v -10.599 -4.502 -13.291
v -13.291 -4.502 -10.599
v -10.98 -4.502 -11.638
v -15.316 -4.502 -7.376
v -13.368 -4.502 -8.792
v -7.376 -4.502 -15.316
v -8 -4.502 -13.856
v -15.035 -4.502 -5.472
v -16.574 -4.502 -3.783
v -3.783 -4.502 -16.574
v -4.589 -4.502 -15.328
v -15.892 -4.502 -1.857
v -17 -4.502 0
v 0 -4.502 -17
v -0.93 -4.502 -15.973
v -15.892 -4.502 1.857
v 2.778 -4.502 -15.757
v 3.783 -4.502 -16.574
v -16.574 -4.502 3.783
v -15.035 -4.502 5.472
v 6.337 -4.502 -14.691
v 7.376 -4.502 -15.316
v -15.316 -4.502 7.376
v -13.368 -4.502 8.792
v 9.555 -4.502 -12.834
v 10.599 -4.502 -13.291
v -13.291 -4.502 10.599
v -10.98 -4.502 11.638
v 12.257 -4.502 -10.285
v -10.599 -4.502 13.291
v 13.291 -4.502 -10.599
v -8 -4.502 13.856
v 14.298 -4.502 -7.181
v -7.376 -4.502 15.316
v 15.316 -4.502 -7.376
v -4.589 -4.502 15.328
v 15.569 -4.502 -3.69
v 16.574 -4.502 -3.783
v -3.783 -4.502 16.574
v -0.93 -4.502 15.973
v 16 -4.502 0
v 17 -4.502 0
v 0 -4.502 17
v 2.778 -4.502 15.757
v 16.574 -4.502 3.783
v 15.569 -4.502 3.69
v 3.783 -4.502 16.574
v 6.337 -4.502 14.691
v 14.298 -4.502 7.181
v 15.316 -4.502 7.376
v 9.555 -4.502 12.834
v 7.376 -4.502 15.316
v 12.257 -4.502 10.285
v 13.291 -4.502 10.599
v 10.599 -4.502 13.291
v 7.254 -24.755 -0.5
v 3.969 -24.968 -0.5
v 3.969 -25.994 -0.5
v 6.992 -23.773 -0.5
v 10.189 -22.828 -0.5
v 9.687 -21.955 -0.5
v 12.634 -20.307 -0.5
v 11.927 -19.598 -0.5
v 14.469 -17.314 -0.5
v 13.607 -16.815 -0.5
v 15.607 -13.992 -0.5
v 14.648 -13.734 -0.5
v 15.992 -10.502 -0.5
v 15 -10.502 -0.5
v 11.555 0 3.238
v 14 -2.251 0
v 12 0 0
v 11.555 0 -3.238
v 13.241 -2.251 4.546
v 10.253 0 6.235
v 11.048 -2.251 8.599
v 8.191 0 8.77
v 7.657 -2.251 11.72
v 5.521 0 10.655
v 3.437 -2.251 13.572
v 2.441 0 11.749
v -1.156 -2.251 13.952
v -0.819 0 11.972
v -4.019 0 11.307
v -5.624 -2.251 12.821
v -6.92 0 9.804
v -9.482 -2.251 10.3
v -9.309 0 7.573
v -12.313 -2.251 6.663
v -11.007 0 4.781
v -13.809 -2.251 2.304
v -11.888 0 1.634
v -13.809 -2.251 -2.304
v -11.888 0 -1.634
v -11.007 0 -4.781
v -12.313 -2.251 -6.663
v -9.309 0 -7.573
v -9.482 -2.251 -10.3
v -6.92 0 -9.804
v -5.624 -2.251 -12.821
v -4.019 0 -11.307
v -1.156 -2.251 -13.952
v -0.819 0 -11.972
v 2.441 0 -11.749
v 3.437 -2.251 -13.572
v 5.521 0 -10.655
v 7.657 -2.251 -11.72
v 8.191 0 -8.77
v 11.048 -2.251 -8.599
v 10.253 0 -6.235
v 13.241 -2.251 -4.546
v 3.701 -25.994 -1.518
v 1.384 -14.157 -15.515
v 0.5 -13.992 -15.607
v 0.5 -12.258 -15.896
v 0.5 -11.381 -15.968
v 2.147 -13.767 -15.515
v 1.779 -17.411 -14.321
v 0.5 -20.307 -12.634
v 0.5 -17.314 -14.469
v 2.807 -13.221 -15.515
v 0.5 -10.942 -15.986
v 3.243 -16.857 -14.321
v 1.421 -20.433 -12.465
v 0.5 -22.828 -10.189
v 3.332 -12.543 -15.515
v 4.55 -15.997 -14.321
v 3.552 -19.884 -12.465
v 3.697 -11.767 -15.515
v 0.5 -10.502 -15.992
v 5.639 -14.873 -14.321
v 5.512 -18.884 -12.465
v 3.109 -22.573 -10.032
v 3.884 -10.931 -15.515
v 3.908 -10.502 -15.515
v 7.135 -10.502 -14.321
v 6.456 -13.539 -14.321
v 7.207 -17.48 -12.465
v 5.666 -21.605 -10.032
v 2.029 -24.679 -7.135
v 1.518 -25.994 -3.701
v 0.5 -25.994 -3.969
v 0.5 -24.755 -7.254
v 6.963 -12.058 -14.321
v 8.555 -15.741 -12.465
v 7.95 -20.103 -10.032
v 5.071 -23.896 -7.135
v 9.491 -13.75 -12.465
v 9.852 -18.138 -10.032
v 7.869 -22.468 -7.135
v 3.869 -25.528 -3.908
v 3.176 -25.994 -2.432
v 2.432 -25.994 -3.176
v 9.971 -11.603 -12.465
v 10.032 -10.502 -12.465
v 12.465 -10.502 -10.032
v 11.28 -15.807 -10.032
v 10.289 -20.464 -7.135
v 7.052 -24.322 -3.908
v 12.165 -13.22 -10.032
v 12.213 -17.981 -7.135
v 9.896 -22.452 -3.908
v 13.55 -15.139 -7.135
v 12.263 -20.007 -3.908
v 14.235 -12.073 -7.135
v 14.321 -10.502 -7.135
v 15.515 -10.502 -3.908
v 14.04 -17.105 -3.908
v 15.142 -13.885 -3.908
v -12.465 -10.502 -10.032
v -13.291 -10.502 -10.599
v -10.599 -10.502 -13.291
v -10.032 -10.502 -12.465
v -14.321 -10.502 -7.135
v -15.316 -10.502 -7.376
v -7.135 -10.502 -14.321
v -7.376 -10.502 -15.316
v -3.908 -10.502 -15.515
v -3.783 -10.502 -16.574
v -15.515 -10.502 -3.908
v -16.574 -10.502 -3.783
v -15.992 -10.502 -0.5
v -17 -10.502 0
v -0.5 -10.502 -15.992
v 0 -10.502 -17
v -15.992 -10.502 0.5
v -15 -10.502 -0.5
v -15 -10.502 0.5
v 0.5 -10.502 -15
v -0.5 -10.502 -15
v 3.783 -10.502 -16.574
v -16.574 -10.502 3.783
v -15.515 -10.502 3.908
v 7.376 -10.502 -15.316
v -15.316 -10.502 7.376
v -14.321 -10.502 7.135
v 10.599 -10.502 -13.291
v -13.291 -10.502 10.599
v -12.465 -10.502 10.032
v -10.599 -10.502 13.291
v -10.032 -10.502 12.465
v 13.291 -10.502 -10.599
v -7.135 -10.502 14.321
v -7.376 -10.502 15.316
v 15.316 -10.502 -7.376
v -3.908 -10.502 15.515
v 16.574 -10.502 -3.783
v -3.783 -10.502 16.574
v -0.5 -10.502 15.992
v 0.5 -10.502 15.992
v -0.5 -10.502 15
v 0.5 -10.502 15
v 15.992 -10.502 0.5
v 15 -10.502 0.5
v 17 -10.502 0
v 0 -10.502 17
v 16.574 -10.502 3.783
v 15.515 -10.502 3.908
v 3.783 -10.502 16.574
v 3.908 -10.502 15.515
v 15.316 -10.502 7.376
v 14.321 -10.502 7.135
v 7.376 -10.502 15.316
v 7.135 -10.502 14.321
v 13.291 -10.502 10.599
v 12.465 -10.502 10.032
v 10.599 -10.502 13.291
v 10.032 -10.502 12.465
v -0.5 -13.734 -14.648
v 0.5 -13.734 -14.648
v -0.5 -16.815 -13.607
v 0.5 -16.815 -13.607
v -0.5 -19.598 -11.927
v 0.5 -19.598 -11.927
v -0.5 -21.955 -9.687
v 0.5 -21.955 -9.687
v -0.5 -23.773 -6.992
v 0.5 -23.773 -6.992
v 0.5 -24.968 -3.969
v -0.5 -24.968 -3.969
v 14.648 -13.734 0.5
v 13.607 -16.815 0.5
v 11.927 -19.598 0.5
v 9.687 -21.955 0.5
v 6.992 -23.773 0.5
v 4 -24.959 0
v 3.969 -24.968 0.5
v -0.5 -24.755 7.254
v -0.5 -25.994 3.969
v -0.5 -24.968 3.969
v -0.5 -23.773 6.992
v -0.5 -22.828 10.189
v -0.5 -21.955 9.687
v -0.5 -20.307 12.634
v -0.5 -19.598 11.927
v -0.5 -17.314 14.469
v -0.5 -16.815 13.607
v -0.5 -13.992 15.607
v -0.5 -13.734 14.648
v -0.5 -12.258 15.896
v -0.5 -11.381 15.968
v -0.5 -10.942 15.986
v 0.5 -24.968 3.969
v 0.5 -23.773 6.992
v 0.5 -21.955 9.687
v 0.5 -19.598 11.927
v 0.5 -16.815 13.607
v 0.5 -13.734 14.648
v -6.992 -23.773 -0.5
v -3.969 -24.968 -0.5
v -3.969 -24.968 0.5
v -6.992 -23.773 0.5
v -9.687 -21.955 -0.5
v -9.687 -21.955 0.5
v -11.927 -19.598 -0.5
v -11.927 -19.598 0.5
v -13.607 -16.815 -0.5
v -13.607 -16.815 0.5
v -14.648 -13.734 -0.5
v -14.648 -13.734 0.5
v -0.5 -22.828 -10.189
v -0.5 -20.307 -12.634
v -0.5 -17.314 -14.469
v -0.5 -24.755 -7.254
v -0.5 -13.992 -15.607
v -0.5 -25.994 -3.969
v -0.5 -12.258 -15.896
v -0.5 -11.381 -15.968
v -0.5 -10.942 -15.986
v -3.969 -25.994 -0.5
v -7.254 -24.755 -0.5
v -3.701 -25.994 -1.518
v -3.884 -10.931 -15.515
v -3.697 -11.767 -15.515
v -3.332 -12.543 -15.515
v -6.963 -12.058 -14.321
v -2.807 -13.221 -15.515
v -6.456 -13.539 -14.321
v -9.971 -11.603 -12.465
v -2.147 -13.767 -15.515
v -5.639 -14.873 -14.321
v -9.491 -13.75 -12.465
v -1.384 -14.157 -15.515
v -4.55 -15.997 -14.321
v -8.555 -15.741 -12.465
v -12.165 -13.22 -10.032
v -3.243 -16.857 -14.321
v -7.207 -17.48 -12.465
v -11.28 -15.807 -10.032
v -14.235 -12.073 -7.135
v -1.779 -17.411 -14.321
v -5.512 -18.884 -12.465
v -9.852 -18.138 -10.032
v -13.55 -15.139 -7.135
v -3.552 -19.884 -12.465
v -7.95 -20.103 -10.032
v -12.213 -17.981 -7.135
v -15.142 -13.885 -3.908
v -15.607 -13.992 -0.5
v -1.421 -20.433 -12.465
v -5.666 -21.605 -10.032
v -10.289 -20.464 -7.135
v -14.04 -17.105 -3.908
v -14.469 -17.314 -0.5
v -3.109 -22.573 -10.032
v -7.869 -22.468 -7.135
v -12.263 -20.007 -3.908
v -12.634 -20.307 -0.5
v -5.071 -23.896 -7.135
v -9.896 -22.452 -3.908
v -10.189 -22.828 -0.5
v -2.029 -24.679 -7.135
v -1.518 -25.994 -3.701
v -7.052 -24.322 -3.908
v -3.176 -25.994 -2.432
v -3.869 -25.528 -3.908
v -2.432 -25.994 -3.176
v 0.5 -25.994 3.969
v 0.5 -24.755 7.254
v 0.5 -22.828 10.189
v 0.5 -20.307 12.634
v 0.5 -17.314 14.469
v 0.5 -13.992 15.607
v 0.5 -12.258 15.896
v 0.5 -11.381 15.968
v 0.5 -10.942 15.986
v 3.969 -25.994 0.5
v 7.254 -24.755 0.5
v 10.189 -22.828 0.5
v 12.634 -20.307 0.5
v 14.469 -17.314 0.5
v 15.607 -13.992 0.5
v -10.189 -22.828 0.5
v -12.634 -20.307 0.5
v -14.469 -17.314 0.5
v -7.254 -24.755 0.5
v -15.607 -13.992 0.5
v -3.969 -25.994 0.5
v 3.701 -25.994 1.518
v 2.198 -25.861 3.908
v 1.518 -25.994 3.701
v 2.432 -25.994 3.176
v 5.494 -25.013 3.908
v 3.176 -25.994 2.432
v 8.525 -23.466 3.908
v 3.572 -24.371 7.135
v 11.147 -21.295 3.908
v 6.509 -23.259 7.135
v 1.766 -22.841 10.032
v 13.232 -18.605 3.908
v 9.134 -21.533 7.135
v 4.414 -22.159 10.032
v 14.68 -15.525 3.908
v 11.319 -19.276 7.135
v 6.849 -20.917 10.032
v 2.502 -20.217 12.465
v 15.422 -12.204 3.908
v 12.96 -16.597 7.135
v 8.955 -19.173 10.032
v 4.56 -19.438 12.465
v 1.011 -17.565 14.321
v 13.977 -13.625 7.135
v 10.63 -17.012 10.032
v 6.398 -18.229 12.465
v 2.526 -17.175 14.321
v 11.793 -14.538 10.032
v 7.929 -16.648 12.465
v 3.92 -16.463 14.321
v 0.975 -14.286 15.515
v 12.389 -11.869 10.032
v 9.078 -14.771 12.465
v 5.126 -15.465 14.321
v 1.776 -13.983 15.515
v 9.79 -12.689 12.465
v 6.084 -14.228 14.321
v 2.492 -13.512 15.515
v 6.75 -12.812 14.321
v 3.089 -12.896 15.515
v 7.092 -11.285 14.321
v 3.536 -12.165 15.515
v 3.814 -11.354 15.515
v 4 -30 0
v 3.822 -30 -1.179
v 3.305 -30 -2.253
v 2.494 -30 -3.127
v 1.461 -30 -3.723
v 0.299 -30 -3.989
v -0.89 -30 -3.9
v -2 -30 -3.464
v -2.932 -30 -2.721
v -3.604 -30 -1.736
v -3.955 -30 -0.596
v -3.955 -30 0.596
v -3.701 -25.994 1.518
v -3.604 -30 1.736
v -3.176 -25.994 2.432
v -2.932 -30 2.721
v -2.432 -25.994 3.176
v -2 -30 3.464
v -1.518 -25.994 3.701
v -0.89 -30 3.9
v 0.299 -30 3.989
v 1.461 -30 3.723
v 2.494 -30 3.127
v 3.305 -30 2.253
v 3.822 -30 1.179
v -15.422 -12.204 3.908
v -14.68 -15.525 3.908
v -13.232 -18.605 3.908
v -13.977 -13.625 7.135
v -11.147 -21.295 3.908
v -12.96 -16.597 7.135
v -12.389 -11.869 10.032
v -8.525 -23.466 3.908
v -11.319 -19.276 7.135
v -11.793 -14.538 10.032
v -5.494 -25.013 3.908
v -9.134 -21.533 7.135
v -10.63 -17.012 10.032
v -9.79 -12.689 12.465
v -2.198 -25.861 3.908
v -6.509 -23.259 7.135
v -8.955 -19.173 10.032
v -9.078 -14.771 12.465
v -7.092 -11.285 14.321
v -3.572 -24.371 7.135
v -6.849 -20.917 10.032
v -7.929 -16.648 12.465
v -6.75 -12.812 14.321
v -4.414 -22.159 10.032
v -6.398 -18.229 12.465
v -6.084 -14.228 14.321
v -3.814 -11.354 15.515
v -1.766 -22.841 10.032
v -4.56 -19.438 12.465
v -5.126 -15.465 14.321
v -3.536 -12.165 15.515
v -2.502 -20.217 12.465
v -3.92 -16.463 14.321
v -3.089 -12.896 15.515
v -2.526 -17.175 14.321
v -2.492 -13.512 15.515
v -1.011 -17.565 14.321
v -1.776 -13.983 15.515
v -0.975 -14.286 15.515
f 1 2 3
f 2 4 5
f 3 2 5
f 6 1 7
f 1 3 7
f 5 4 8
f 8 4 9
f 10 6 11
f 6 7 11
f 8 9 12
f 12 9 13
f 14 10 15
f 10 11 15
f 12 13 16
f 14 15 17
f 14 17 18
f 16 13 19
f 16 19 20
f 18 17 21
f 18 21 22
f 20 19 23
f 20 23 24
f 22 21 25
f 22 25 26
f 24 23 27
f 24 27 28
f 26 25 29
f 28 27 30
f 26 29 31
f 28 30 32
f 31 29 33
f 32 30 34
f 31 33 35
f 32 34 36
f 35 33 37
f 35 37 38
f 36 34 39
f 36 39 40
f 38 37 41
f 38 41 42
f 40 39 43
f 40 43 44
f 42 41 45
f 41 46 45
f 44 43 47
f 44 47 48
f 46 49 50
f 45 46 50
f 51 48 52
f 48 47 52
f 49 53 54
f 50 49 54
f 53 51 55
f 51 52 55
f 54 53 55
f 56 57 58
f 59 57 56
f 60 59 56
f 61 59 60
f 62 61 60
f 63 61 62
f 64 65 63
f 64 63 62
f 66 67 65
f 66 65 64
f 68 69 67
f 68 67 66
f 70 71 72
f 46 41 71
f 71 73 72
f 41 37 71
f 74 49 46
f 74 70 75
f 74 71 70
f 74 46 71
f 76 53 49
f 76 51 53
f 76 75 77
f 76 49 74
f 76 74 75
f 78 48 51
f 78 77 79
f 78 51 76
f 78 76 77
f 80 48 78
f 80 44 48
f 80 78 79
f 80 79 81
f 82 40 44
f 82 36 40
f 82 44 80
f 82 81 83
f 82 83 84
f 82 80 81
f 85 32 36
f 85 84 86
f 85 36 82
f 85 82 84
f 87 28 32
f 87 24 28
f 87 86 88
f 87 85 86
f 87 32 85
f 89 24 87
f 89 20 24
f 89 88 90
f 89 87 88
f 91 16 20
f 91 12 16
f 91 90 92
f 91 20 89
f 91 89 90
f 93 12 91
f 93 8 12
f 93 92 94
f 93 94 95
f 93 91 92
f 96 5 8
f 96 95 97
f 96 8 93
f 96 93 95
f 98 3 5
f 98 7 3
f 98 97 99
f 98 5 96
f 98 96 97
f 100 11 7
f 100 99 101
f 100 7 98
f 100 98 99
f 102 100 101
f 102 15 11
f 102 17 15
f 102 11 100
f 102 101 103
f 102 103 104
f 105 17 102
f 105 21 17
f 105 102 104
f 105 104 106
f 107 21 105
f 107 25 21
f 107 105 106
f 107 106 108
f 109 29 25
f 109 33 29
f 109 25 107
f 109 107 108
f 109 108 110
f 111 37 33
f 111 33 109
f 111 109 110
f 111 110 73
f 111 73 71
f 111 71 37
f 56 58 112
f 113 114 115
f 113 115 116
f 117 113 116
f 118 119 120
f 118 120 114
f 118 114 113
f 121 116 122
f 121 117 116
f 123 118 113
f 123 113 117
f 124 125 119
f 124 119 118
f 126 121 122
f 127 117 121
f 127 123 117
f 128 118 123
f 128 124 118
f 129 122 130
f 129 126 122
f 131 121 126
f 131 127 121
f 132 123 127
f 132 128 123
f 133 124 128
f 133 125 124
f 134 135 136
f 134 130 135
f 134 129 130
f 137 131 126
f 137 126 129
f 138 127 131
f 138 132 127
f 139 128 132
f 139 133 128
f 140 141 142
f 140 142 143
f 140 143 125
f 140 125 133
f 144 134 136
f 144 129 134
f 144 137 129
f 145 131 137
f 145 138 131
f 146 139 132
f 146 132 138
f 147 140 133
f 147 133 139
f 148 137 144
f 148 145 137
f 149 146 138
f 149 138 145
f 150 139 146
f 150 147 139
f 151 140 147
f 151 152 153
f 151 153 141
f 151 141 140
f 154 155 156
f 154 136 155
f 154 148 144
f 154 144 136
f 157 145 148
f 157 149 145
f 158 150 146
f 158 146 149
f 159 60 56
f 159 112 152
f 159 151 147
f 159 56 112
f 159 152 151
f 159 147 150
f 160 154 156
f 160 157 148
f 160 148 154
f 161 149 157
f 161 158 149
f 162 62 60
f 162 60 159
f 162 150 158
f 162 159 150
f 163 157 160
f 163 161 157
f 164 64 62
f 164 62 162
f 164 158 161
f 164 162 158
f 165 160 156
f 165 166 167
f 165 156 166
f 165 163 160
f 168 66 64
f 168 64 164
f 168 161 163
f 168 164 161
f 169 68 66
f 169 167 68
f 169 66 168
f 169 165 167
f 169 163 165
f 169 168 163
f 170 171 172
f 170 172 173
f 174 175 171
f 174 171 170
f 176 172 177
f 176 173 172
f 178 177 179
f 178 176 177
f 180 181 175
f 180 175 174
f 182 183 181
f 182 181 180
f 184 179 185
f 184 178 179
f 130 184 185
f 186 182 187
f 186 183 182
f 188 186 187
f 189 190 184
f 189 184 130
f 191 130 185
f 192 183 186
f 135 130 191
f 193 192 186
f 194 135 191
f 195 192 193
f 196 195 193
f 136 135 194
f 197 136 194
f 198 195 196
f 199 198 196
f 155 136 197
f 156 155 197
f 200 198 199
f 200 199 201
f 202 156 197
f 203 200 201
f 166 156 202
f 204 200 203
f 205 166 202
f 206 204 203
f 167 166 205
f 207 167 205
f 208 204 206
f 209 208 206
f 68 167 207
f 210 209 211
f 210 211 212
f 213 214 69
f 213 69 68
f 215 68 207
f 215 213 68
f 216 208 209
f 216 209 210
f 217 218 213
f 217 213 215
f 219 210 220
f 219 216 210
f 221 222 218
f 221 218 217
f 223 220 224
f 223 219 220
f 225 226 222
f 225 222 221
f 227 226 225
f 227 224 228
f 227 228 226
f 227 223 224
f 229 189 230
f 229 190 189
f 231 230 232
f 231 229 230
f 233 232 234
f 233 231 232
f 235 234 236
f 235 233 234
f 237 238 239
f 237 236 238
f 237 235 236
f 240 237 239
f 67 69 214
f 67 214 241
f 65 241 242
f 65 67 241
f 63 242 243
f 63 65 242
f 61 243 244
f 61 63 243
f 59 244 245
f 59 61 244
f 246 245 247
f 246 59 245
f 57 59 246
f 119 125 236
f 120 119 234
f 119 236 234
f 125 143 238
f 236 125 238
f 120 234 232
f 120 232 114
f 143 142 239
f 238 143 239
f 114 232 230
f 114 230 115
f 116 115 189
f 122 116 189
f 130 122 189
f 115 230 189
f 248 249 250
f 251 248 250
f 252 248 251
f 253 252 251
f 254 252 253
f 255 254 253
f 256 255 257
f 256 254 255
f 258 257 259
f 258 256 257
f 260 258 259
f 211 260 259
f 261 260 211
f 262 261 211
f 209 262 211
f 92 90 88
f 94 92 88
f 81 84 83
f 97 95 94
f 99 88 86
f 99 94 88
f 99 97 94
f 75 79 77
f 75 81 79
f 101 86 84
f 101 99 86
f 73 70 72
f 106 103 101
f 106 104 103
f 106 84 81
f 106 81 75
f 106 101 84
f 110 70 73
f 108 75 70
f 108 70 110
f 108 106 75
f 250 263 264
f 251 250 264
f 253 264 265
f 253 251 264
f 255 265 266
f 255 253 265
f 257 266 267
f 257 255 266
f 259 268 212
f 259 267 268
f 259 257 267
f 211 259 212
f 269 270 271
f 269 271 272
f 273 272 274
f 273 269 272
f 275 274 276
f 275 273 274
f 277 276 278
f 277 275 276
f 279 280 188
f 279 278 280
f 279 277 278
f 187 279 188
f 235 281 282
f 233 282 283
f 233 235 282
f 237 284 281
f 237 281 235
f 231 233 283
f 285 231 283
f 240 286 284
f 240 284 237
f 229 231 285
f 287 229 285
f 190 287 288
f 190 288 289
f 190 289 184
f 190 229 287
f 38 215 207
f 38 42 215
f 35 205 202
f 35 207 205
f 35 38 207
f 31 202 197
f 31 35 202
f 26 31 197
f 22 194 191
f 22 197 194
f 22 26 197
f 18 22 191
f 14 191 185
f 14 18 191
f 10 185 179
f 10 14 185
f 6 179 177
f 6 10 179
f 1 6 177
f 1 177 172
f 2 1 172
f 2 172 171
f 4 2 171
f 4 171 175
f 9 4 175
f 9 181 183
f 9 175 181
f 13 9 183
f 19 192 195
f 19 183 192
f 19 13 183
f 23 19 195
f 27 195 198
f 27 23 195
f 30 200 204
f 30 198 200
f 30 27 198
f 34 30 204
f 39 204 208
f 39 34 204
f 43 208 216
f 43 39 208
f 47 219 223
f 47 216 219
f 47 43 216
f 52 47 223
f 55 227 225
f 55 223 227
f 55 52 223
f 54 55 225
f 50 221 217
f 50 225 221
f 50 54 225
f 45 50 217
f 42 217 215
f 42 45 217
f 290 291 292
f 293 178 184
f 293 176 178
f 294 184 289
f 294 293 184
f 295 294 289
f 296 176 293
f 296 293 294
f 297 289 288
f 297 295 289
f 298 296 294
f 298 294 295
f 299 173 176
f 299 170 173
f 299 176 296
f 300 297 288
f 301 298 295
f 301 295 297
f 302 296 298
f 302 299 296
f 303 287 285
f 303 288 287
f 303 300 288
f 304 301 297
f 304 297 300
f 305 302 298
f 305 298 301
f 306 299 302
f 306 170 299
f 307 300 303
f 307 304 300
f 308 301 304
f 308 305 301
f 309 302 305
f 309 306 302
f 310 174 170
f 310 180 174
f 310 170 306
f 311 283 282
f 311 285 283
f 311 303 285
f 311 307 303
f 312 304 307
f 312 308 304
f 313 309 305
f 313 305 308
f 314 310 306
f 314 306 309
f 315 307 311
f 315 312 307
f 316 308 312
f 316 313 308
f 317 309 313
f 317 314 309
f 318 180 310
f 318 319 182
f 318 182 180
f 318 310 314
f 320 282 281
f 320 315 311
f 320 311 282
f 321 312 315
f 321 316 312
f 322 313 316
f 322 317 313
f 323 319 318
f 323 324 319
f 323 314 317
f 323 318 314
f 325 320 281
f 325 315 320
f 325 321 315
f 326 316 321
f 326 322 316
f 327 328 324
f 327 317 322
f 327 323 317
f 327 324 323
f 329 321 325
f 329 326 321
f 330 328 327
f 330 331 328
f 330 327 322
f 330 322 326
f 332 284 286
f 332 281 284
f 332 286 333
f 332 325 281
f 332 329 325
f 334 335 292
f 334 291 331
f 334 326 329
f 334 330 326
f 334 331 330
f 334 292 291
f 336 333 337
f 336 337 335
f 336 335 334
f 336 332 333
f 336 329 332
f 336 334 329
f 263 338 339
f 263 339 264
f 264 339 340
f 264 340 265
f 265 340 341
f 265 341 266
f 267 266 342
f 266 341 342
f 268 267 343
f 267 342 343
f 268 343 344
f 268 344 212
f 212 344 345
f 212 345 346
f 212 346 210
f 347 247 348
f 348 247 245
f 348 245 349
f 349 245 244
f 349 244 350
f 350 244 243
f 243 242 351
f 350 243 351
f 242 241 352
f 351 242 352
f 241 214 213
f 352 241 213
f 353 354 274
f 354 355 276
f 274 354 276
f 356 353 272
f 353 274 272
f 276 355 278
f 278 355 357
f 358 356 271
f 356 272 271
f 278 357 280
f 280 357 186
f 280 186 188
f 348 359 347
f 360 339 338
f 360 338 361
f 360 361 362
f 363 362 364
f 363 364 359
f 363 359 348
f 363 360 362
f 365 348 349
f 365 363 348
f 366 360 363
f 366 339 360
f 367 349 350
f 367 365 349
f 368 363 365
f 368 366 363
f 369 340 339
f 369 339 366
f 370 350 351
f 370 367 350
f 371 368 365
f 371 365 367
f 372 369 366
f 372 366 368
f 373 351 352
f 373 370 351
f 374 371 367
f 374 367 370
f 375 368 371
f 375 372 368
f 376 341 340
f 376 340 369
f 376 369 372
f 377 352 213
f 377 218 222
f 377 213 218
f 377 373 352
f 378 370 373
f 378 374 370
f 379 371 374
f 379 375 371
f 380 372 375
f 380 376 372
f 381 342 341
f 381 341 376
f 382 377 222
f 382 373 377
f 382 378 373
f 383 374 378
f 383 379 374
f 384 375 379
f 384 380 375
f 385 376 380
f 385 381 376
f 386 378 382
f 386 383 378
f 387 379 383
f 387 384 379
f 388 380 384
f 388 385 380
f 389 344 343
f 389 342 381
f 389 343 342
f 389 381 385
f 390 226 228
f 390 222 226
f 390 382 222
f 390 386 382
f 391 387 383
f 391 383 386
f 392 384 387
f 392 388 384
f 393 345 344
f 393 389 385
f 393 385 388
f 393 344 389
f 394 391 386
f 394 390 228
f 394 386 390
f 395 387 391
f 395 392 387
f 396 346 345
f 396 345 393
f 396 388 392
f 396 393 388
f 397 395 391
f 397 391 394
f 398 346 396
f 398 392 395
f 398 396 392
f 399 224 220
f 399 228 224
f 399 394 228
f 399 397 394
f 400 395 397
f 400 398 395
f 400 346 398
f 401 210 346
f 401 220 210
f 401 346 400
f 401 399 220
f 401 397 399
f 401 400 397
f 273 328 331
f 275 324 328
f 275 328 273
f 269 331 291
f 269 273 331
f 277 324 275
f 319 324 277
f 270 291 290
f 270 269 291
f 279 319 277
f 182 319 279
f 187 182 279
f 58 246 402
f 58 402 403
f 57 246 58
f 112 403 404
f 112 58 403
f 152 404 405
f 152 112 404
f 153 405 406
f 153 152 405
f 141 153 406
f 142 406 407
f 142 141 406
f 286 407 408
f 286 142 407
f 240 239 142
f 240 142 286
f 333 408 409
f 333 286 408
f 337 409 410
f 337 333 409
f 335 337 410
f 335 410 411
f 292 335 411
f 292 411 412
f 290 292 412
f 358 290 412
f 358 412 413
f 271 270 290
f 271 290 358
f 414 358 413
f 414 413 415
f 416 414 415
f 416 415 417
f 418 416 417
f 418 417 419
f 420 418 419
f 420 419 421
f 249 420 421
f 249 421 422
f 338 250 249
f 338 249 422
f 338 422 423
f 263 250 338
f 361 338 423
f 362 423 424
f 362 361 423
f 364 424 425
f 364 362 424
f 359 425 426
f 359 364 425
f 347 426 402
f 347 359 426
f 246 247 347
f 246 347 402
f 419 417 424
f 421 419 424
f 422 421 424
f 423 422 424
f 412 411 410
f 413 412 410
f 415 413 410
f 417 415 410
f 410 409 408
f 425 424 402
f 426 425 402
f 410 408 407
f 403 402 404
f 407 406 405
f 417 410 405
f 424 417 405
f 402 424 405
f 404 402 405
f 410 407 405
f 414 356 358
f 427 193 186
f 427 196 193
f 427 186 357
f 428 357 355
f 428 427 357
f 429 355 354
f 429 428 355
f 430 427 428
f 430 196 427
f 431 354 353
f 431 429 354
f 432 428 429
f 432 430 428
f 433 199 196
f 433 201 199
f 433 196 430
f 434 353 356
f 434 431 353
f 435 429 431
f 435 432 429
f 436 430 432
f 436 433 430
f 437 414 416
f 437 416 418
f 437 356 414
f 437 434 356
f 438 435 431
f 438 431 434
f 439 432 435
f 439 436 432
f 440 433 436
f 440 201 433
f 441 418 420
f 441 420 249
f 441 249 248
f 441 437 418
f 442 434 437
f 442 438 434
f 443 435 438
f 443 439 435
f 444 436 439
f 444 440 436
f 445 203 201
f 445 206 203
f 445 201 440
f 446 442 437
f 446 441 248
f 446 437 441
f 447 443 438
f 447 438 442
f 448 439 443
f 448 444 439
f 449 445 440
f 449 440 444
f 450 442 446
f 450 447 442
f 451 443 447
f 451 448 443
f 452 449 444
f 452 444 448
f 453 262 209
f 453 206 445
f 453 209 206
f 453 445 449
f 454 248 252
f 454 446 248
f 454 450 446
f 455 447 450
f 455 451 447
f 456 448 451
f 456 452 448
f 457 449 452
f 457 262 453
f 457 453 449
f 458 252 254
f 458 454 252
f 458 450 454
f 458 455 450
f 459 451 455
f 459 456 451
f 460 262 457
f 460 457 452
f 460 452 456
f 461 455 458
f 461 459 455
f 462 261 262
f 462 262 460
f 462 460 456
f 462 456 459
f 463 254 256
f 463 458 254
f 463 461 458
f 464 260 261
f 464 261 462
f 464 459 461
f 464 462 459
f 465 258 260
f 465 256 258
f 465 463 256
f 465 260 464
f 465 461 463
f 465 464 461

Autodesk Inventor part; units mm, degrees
ref_plane "YZ Plane" through (0, 0, 0) normal (1, 0, 0) x (0, 1, 0)
ref_plane "XZ Plane" through (0, 0, 0) normal (0, 1, 0) x (-1, 0, 0)
ref_plane "XY Plane" through (0, 0, 0) normal (0, 0, 1) x (1, 0, 0)
sketch "草圖1" plane through (0, 0, 0) normal (0, 0, 1) x (1, 0, 0)
  line L0 (0, 0) -> (12, 0)
  line L1 (12, 0) -> (16, -4.5023)
  line L2 (16, -4.5023) -> (0, -4.5023)
  line L3 (0, 0) -> (0, -4.5023)
  dimension "d0" = 12
  dimension "d1" = 16
revolve "迴轉1" add sketch "草圖1" angle 360 about axis through (0, 0, 0) along (0, -1, 0)
sketch "草圖2" plane through (0, -4.5023, 0) normal (0, -1, 0) x (1, 0, 0)
  circle A0 centre (0, 0) radius 17
  dimension "d3" = 34
extrude "擠出1" add sketch "草圖2" along normal blind 6
sketch "草圖3" plane through (0, -10.5023, 0) normal (0, -1, 0) x (1, 0, 0)
  circle A0 centre (0, 0) radius 16
  circle A1 centre (0, 0) radius 16 projected
  line L0 (0, 16) -> (0, -16)
  dimension "d6" = 32
revolve "迴轉2" add sketch "草圖3" angle 180 about axis through (0, -10.5023, 16) along (0, 0, -1) picked at (2.314, 4.8052) contours A0 L0
sketch "草圖4" plane through (0, 0, 0) normal (0, 0, 1) x (1, 0, 0)
  arc A0 (-16, -10.5023) -> (16, -10.5023) centre (0, -10.5023) ccw projected
  arc A1 (-16, -10.5023) -> (16, -10.5023) centre (0, -10.5023) ccw
  line L0 (-17, -10.5023) -> (17, -10.5023) projected
  arc A2 (-15, -10.5023) -> (15, -10.5023) centre (0, -10.5023) ccw
  line L1 (-16, -10.5023) -> (-15, -10.5023)
  line L2 (15, -10.5023) -> (16, -10.5023)
  point P0 (0, 0)
  dimension "d8" = 1
extrude "擠出2" cut sketch "草圖4" along normal mid plane 1 contours L0 A2 A0
sketch "草圖5" plane through (0, 0, 0) normal (1, 0, 0) x (0, 1, 0)
  arc A0 (-10.5023, 16) -> (-26.4945, 0.5) centre (-10.5023, 0) ccw projected
  arc A1 (-26.4945, -0.5) -> (-10.5023, -16) centre (-10.5023, 0) ccw projected
  arc A2 (-10.5023, 16) -> (-10.5023, -16) centre (-10.5023, 0) ccw
  line L0 (-10.5023, -16) -> (-10.5023, -0.5) projected
  arc A3 (-10.5023, 15) -> (-10.5023, -15) centre (-10.5023, 0) ccw
  line L1 (-10.5023, -16) -> (-10.5023, -15)
  line L2 (-10.5023, 16) -> (-10.5023, 15)
  line L3 (-10.5023, 17) -> (-10.5023, -17) projected
  point P0 (0, 0)
  point P1 (-26.4945, 0.5)
  point P2 (-26.4945, -0.5)
  dimension "d11" = 1
extrude "擠出3" cut sketch "草圖5" along normal mid plane 1 contours L2 A3 L0 A1 A2 A0
sketch "草圖6" plane through (0, 0, 0) normal (0, 1, 0) x (1, 0, 0)
  line L0 (0.5, -0.5) -> (0, 0) projected
  circle A0 centre (0, 0) radius 4
  dimension "d14" = 8
extrude "擠出4" add sketch "草圖6" against normal blind 30
properties part number "屋1 物1 base"
